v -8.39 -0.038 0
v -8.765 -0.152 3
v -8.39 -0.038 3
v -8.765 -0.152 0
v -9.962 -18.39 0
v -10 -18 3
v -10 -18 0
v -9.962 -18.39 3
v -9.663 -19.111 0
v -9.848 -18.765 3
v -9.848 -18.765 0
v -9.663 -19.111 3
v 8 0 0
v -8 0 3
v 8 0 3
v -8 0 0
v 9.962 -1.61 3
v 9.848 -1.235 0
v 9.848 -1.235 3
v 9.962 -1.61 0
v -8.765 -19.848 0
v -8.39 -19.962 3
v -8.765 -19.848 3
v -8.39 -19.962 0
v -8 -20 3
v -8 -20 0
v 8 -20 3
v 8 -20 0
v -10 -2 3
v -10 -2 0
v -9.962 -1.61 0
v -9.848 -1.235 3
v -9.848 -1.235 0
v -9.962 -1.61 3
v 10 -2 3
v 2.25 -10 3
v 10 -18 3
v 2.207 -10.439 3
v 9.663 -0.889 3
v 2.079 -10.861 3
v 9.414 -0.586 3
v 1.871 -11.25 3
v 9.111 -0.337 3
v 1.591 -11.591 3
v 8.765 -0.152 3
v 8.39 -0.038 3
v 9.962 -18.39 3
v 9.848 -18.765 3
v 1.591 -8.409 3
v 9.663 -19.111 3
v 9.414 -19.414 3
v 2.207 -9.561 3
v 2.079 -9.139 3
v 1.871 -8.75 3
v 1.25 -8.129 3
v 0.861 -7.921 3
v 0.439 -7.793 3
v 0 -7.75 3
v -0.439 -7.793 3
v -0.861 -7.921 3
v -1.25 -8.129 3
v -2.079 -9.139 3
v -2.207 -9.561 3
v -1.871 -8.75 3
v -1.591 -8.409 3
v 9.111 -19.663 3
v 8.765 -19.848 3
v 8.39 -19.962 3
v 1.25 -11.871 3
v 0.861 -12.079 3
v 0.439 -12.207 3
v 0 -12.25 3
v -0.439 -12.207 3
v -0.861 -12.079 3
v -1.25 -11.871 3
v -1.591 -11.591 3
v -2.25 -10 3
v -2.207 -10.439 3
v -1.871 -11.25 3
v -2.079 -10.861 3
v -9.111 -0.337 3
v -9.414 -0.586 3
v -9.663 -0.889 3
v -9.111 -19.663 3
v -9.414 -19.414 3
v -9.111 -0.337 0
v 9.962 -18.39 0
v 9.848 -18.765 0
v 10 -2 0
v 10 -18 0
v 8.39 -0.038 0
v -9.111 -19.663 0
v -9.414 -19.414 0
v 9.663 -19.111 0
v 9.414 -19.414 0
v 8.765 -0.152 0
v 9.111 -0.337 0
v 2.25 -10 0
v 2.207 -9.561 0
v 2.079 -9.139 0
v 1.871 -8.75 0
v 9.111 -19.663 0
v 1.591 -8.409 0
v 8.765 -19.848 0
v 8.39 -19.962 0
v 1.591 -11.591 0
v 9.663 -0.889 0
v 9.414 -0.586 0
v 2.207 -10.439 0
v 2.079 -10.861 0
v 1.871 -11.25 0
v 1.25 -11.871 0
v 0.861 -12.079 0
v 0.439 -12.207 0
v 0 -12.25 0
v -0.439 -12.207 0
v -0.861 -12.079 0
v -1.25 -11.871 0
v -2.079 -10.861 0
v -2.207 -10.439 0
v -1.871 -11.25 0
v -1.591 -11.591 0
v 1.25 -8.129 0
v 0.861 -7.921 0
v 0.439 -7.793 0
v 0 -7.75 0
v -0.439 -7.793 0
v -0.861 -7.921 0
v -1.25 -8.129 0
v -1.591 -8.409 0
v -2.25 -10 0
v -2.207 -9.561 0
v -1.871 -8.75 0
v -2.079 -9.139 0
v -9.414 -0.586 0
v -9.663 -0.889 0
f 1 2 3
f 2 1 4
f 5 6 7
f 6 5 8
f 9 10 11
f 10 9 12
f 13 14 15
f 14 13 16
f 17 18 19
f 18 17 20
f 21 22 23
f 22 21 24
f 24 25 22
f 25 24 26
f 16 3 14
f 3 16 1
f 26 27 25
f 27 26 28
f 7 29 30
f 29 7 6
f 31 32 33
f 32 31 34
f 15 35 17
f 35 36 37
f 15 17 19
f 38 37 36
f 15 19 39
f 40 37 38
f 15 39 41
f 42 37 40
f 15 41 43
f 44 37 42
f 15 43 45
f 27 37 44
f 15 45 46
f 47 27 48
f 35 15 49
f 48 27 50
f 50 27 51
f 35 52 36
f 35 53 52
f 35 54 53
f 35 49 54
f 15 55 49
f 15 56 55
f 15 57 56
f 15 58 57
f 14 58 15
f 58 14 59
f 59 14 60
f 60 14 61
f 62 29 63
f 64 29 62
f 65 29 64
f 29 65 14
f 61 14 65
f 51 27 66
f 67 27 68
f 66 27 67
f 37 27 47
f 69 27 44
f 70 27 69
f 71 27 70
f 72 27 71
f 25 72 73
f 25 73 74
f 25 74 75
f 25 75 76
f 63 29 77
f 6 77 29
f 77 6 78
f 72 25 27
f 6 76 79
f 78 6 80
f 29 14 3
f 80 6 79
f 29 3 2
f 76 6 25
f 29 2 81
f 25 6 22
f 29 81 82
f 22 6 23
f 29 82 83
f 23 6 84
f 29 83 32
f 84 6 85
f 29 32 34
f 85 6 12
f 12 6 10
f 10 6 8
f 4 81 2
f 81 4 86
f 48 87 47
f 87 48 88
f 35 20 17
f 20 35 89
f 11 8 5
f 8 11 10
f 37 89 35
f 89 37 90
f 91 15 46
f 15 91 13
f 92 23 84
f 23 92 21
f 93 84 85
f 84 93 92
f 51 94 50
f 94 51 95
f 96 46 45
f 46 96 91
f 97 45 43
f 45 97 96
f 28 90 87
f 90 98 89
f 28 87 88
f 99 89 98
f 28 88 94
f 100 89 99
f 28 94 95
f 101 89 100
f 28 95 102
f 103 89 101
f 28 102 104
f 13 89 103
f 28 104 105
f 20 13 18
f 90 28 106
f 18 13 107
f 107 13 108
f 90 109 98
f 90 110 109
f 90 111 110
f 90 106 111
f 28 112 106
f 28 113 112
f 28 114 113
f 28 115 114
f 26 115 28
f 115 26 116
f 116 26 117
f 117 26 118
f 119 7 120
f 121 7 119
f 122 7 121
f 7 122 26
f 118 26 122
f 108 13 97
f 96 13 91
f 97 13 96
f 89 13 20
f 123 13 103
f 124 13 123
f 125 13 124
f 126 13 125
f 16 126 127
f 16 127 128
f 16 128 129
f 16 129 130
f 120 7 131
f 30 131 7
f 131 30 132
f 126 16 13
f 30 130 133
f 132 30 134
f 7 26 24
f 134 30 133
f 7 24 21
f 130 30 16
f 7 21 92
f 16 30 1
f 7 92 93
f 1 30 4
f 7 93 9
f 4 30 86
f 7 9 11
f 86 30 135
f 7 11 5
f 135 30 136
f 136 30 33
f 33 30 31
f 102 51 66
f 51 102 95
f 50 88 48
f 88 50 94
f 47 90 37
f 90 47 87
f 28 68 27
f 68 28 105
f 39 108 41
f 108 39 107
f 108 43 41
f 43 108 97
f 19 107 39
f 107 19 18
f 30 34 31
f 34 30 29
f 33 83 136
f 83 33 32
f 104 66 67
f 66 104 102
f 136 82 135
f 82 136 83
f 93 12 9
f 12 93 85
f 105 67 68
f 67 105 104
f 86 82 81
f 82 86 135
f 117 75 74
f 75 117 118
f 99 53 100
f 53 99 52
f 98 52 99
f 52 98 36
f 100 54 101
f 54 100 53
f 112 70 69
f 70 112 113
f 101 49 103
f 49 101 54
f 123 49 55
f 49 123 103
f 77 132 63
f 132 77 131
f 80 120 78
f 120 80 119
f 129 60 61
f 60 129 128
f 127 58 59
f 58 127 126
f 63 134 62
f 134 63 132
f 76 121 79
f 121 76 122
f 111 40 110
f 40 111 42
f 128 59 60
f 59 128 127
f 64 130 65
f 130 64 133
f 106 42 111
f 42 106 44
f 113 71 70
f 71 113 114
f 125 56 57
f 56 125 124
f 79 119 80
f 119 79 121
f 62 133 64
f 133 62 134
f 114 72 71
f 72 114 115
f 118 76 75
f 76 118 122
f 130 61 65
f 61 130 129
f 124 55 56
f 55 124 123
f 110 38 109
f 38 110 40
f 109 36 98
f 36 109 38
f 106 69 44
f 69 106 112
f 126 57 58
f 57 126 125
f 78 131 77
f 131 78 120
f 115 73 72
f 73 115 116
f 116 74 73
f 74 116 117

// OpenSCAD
//By Coat, 29-jul-2018
//Licensed under the Creative Commons - Attribution license.

//primary parameters 

/*[The Base]*/
//The height of the plate (mm, Y direction)
platelength = 20; //[0:0.1:200]
//The width for mountingplate at the left side (mm, X-direction to the left)
platewidthleft = 10; //[0:0.1:200]
//The width for mountingplate at the right side (mm,, X-direction to the right)
platewidthright = 10; //[0:0.1:200]
//Thickness of the mounting plate (mm, left and right, Z-direction)
platethick = 3; //[0:0.1:20] 
//The offset of the plate from the object you will put it on (mm, Z-direction)
plateoffsetdepth = 0; //[0:0.1:100]
//Round corners Yes (1) or No (0)
roundcorner = 1;
//If using round corners use this radius (mm)
cornerrad = 2; //[0:0.1:20]
//Ridge for aligning 2020 alu frame , Yes (1) or No (0)
ridge2020 = 0;
/*[The optional Helpgrid]*/
//Helpgrid, 0 is none, >0 is line distance in mm. Do'nt forget to set it back to 0 (off) when your done. 
helpgridmm = 0; //[0:20]


/*[Hole 1]*/
//Give the X-position in mm. Negative for left side, positive for right side. 
mhole01x = 0; //[-200:0.1:200]
//Give the Y-position, always positive
mhole01y = 10; //[0:0.1:200]
//And give the diameter of the hole
mhole01diam = 4.5; //[0:0.1:200]

/*[Hole 2]*/
//Give the X-position in mm. Negative for left side, positive for right side. 
mhole02x = 0; //[-200:0.1:200]
//Give the Y-position, always positive
mhole02y = 0; //[0:0.1:200]
//And give the diameter of the hole
mhole02diam = 4.5; //[0:0.1:200]

/*[Hole 3]*/
//Give the X-position in mm. Negative for left side, positive for right side. 
mhole03x = 0; //[-200:0.1:200]
//Give the Y-position, always positive
mhole03y = 0; //[0:0.1:200]
//And give the diameter of the hole
mhole03diam = 4.5; //[0:0.1:200]

/*[Hole 4]*/
//Give the X-position in mm. Negative for left side, positive for right side. 
mhole04x = 0; //[-200:0.1:200]
//Give the Y-position, always positive
mhole04y = 0; //[0:0.1:200]
//And give the diameter of the hole
mhole04diam = 4.5; //[0:0.1:200]

/*[Hole 5]*/
//Give the X-position in mm. Negative for left side, positive for right side. 
mhole05x = 0; //[-200:0.1:200]
//Give the Y-position, always positive
mhole05y = 0; //[0:0.1:200]
//And give the diameter of the hole
mhole05diam = 4.5; //[0:0.1:200]

/*[Hole 6]*/
// Give the X-position in mm. Negative for left side, positive for right side. 
mhole06x = 0; //[-200:0.1:200]
//Give the Y-position, always positive
mhole06y = 0; //[0:0.1:200]
//And give the diameter of the hole
mhole06diam = 4.5; //[0:0.1:200]

/*[Hole 7]*/
//Give the X-position in mm. Negative for left side, positive for right side. 
mhole07x = 0; //[-200:0.1:200]
//Give the Y-position, always positive
mhole07y = 0; //[0:0.1:200]
//And give the diameter of the hole
mhole07diam = 4.5; //[0:0.1:200]

/*[Hole 8]*/
//Give the X-position in mm. Negative for left side, positive for right side. 
mhole08x = 0; //[-200:0.1:200]
//Give the Y-position, always positive
mhole08y = 0; //[0:0.1:200]
//And give the diameter of the hole
mhole08diam = 4.5; //[0:0.1:200]

/*[Hole 9]*/
//Give the X-position in mm. Negative for left side, positive for right side. 
mhole09x = 0; //[-200:0.1:200]
//Give the Y-position, always positive
mhole09y = 0; //[0:0.1:200]
//And give the diameter of the hole
mhole09diam = 4.5; //[0:0.1:200]

/*[Hole 10]*/
//Give the X-position in mm. Negative for left side, positive for right side. 
mhole10x= 0; //[-200:0.1:200]
//Give the Y-position, always positive
mhole10y = 0; //[0:0.1:200]
//And give the diameter of the hole
mhole10diam = 4.5; //[0:0.1:200]

module corner(cr, pt)
{
  if (roundcorner)
  {
    $fn = 32;
    cylinder(r=cr, h = pt);
  }
  else
  {
    $fn = 4;
    rotate([0,0,45])
    cylinder(r=sqrt(2)*cr, h = pt);
  } 
}

module hullplate(dwr,dwl,dh,cr,pt)
{
  hull()
  {
    translate([dwr, dh,0])    //topright
      corner(cr, pt);
    translate([dwl, dh,0])    //topleft
      corner(cr, pt);
    translate([dwl, -dh,0])   //bottomleft
      corner(cr, pt);
    translate([dwr, -dh,0])   //bottomright
      corner(cr, pt);
  }
}

module plate()
{
  union()
  {
    color("Yellow") 
    hullplate(platewidthright - cornerrad2,    //width right side Mplate
              -platewidthleft + cornerrad2,    //width left side Mplate
              0.5*platelength - cornerrad2,    //height Mplate 
              cornerrad2,                      //cornerradius    
              platethick);                    //thickness Mplate  

    if(plateoffsetdepth!=0)
      color("MediumSeaGreen")
      translate([podx,0,-plateoffsetdepth]) 
         hullplate(0.5*podw-cornerrad2,         //width right side offsetplate
                   -0.5*podw+cornerrad2,        //width left side offsetplate
                   0.5*platelength-cornerrad2,  //height offsetplate
                   cornerrad2,                  //same cornerradius
                   plateoffsetdepth);          //thickness offsetplate

    if(ridge2020)   
       color("DarkOrange")  
       translate([rx,0,-0.5*rt - plateoffsetdepth]) 
         cube([rw,platelength,rt], center = true); 
  }
}

module mountinghole(xmh,ymh,diamh)
{
  if (xmh!=0||ymh!=0)
  { 
     $fn=32;
     translate([xmh,-ymh,0]) 
       cylinder(d = diamh, h = 3*(platethick + rt + plateoffsetdepth), center=true); 
  }  
}  

module helpgrid(wl,wr,hp,tp,dg)
{
  linew = 0.4;               //width gridlines 
  for(i = [0:dg:floor(wl)])  //grid left vertical
  {
    color([0,1,0]) translate([-i,-0.5*hp,tp])
      cube([linew,hp,linew], center = true);  
  }
  for(i = [0:dg:floor(hp)])  //grid left horizontal
  {
    color([0,1,0]) translate([-0.5*wl,-i,tp])
      cube([wl,linew,linew], center = true);  
  }
  for(i = [0:dg:floor(wr)])   //grid right vertical          
  {
     color([0,0.5,0]) translate([i,-0.5*hp,tp])
     cube([linew,hp,linew], center = true);  
  }
  for(i = [0:dg:floor(hp)])  //grid right horizontal          
  {
    color([0,0.5,0]) translate([0.5*wr,-i,tp])
      cube([wr,linew,linew], center = true);  
  }
  color([1,0,0]) translate([0,-0.5*hp,tp])  //0-line
    cube([linew*2,hp,linew], center = true);  
  color([1,0,0,0.2]) translate([0,-0.5*hp,tp]) //2020-frame-zone
    cube([podw,hp,linew/2], center = true);  
}  

//Main
//secondary parameters
rx = 0;    //position ridge
rt=1.4;     //thickness ridge
rw = 5.8; //width ridge
podx =0;  //position offsetplate;
podw =20; //width offsetplate

//recalculated parameters
cornerrad2 = min(max(cornerrad,1), 0.5*platelength, 0.5* (platewidthleft + platewidthright));  //max -> you need a radius also with square. min -> radius can't be bigger than the half of the buidsizes.

//the Thing
difference()
{
  union()
  {
    translate([0,-0.5*platelength,0])
      plate();
    if(helpgridmm > 0)
      helpgrid(platewidthleft, platewidthright, platelength, platethick,helpgridmm);
  }
  mountinghole(mhole01x,mhole01y, mhole01diam);
  mountinghole(mhole02x,mhole02y, mhole02diam);
  mountinghole(mhole03x,mhole03y, mhole03diam);
  mountinghole(mhole04x,mhole04y, mhole04diam);
  mountinghole(mhole05x,mhole05y, mhole05diam);
  mountinghole(mhole06x,mhole06y, mhole06diam);
  mountinghole(mhole07x,mhole07y, mhole07diam);
  mountinghole(mhole08x,mhole08y, mhole08diam);
  mountinghole(mhole09x,mhole09y, mhole09diam);
  mountinghole(mhole10x,mhole10y, mhole10diam);
}
